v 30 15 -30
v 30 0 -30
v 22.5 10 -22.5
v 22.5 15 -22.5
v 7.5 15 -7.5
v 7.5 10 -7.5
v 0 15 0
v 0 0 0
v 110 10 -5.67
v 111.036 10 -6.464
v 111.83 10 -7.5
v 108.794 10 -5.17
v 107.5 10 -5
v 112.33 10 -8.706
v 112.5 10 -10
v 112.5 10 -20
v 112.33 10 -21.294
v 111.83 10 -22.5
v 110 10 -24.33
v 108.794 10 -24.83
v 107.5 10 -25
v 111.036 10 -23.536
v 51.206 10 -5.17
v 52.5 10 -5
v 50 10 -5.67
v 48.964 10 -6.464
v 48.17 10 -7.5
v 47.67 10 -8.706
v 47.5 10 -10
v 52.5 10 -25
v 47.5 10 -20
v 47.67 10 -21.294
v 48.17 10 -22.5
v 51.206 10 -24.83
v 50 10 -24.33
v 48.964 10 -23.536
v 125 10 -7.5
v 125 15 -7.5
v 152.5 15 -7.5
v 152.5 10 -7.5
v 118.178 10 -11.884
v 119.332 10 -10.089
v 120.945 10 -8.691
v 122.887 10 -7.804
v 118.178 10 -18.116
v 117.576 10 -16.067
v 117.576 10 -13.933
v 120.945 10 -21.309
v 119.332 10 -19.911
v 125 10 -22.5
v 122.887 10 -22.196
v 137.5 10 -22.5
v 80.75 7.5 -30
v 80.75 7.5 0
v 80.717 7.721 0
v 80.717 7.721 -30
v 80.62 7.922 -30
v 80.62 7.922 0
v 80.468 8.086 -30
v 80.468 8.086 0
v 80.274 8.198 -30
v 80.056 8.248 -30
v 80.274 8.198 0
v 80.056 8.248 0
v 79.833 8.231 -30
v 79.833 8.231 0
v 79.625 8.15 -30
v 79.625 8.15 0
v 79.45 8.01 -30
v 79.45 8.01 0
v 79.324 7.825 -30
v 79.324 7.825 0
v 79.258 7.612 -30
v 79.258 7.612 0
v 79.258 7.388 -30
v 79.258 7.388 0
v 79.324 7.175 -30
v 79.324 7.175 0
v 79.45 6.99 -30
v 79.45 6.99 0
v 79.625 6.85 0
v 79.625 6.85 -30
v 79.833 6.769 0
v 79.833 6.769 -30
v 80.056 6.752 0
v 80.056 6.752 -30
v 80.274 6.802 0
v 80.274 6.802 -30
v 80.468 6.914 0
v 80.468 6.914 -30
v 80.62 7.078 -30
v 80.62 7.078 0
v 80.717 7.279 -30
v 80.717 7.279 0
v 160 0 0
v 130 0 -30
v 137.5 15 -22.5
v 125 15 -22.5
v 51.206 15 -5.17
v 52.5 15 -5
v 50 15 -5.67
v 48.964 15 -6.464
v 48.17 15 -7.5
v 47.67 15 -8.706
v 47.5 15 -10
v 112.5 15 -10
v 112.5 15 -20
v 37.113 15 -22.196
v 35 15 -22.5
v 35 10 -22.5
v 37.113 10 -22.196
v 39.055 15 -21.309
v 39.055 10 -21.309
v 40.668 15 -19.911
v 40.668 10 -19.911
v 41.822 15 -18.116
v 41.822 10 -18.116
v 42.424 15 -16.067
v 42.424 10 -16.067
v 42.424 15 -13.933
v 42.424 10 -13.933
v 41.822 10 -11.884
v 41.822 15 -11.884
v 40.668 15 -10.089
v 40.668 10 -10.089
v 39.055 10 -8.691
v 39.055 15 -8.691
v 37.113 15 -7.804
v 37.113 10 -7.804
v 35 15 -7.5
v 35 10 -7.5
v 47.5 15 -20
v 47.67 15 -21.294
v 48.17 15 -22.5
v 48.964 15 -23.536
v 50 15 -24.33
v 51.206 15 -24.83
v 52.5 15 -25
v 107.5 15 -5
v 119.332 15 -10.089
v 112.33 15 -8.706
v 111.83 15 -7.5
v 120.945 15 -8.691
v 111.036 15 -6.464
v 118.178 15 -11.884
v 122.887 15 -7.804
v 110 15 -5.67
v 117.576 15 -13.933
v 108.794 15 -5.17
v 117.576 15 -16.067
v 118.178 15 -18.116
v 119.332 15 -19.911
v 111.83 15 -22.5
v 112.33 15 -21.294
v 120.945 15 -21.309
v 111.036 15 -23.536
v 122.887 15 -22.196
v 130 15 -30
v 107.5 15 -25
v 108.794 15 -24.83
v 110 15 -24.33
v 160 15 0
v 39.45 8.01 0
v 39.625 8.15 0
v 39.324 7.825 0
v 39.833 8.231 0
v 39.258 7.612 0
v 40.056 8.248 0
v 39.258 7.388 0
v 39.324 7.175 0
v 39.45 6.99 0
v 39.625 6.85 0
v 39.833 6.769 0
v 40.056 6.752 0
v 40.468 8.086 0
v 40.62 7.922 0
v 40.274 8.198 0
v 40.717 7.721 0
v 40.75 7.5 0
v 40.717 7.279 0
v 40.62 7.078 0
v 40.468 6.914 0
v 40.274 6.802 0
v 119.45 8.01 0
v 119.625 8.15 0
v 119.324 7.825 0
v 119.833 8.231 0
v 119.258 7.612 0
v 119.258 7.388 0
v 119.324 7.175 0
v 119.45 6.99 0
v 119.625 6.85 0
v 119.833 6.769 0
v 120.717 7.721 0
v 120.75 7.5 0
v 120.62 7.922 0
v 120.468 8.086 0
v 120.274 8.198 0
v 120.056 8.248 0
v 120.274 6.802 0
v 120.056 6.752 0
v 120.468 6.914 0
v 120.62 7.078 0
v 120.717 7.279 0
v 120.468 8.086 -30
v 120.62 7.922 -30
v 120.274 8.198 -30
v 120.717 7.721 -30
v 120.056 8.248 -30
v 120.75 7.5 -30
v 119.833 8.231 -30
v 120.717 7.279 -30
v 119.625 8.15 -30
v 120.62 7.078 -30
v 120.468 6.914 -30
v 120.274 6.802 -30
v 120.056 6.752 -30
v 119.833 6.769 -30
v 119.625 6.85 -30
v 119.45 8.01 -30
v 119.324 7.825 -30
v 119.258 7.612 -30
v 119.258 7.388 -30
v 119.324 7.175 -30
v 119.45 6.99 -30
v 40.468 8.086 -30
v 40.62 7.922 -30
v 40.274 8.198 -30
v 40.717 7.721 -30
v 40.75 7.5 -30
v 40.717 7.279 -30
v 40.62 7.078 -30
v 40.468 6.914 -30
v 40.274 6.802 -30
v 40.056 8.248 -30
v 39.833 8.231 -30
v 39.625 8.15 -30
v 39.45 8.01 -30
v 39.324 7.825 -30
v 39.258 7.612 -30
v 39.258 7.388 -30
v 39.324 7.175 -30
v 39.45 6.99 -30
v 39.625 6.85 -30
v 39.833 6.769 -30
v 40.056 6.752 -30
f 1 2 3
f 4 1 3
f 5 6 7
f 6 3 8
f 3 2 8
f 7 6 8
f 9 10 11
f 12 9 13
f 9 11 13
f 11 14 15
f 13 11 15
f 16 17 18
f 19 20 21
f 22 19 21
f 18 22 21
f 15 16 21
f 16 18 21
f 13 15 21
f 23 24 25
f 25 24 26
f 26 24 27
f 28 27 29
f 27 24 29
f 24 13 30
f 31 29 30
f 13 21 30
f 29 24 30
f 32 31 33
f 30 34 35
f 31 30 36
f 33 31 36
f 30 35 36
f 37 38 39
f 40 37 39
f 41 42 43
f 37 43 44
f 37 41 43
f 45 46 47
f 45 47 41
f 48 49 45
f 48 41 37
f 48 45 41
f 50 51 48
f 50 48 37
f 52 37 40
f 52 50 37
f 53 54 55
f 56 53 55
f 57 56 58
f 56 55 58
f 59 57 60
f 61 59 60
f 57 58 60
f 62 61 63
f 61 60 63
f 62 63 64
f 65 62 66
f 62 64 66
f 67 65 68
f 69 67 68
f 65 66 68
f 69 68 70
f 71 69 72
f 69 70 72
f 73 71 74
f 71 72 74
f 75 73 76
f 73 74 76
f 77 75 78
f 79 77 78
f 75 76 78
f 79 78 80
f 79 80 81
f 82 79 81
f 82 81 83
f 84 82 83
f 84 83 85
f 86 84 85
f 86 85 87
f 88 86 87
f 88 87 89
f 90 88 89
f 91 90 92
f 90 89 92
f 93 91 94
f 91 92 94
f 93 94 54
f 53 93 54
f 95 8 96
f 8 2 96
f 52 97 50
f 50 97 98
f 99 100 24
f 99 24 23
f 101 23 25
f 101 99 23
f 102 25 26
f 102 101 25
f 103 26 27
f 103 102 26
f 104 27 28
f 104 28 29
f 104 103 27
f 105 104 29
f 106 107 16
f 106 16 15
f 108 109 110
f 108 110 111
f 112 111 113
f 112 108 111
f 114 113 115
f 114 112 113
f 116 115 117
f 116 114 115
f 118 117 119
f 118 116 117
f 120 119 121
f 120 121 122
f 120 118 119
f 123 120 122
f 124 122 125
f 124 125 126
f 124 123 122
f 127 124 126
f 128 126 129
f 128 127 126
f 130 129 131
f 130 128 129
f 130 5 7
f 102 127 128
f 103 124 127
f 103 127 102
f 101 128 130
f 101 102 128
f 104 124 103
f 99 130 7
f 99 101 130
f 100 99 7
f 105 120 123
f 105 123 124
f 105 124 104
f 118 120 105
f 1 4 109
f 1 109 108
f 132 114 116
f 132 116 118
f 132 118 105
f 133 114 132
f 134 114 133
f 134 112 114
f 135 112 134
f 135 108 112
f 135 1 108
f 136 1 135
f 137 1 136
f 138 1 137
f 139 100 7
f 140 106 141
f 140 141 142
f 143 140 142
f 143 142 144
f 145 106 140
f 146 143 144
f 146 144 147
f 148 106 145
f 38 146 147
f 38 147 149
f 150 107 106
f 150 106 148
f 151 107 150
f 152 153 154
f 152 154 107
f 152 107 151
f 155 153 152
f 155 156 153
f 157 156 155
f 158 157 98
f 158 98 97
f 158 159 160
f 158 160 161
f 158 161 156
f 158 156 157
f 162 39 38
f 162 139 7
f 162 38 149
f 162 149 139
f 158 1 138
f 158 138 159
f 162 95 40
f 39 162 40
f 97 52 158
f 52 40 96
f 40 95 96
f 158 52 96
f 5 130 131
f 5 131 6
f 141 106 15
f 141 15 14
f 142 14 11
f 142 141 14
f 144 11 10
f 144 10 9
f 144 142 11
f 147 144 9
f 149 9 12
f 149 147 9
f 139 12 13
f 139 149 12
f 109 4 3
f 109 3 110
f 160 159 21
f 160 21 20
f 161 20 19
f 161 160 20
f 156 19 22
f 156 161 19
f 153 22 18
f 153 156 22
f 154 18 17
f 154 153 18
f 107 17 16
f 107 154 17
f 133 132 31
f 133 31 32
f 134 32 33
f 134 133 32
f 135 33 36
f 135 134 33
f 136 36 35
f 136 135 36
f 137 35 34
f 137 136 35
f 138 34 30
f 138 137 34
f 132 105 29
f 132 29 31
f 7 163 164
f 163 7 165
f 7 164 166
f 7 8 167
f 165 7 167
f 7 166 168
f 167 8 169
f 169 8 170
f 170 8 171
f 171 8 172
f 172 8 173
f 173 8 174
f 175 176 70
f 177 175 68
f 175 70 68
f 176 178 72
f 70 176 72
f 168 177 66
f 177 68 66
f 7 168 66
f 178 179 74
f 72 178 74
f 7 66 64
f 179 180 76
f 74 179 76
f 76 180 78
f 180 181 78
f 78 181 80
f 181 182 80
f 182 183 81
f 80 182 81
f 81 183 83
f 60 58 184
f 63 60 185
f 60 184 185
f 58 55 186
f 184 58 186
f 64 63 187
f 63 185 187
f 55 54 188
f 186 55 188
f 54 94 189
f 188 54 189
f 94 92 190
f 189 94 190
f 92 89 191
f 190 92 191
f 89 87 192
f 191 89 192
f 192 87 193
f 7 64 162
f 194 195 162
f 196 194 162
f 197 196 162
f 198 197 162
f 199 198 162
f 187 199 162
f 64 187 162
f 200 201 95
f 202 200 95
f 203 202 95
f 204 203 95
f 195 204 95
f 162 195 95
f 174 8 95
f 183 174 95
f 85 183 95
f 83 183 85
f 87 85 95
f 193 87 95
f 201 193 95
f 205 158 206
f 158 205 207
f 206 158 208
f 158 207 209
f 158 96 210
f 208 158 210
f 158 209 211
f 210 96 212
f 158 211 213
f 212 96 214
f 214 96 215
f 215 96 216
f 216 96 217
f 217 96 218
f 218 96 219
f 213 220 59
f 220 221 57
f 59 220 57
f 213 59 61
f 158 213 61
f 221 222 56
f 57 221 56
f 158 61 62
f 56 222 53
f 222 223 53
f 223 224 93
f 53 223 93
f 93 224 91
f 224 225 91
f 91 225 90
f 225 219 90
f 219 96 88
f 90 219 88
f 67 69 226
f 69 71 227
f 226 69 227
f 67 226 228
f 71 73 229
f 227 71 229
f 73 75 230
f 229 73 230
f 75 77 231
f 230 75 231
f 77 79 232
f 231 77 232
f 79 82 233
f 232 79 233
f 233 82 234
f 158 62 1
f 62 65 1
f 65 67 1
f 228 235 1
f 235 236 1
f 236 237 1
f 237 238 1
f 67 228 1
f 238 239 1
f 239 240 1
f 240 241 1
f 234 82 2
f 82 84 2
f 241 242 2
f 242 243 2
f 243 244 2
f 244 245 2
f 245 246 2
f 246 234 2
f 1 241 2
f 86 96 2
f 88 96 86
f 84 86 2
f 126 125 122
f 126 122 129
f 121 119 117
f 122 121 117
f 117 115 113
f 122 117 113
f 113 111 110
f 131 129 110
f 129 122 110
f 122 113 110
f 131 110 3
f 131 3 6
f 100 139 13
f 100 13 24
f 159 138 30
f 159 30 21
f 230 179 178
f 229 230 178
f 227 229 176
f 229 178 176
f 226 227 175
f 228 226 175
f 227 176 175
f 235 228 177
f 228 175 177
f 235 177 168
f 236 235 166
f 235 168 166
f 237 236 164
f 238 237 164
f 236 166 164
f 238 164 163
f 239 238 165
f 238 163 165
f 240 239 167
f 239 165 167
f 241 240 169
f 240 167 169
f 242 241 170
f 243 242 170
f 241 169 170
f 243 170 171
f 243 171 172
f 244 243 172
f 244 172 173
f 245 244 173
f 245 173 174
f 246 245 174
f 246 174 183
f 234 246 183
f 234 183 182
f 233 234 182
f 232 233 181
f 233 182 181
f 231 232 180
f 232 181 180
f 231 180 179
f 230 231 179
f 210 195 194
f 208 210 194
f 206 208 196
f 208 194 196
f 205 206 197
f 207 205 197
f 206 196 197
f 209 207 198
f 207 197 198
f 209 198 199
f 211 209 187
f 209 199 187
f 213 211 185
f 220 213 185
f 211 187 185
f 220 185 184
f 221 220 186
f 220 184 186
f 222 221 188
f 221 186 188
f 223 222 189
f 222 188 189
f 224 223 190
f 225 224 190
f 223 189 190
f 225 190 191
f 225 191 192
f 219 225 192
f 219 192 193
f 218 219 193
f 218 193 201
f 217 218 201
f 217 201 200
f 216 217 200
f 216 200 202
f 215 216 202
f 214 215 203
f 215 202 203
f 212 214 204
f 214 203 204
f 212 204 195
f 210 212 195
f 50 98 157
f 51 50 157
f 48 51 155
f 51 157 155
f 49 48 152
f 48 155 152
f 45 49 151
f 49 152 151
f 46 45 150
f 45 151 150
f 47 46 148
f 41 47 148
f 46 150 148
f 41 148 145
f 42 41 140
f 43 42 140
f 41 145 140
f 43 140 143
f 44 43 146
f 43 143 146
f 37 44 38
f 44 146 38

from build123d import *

# Parameters (mm, degrees)
BOSS_EXTRUDE1_DEPTH = 15
CUT_EXTRUDE1_DEPTH  = 5
SKETCH3_R           = 0.75
CUT_EXTRUDE2_DEPTH  = 30
CUT_EXTRUDE3_DEPTH  = 5


with BuildPart() as part:
    # Sketch1 → Boss-Extrude1 (new body)
    with BuildSketch(Plane(origin=(0, 0, 0), x_dir=(1, 0, 0), z_dir=(0, 1, 0))):
        Polygon((0, 0), (160, 0), (130, 30), (30, 30), align=None)
    extrude(amount=BOSS_EXTRUDE1_DEPTH)

    # Sketch2 → Cut-Extrude1 (cut)
    with BuildSketch(Plane(origin=(0, 15, 0), x_dir=(1, 0, 0), z_dir=(0, 1, 0))):
        with BuildLine():
            Line((-5, 22.5), (35, 22.5))
            ThreePointArc((35, 22.5), (42.5, 15), (35, 7.5))
            Line((35, 7.5), (-5, 7.5))
            ThreePointArc((-5, 7.5), (-12.5, 15), (-5, 22.5))
        make_face()
        with BuildLine():
            Line((165, 22.5), (125, 22.5))
            ThreePointArc((125, 22.5), (117.5, 15), (125, 7.5))
            Line((125, 7.5), (165, 7.5))
            ThreePointArc((165, 7.5), (172.5, 15), (165, 22.5))
        make_face()
    extrude(amount=-CUT_EXTRUDE1_DEPTH, mode=Mode.SUBTRACT)

    # Sketch3 → Cut-Extrude2 (cut)
    with BuildSketch(Plane.XY):
        with Locations((80, 7.5)):
            Circle(SKETCH3_R)
        with Locations((40, 7.5)):
            Circle(SKETCH3_R)
        with Locations((120, 7.5)):
            Circle(SKETCH3_R)
    extrude(amount=-CUT_EXTRUDE2_DEPTH, mode=Mode.SUBTRACT)

    # Sketch4 → Cut-Extrude3 (cut)
    with BuildSketch(Plane(origin=(0, 15, 0), x_dir=(1, 0, 0), z_dir=(0, 1, 0))):
        with BuildLine():
            Line((52.5, 25), (107.5, 25))
            ThreePointArc((107.5, 25), (111.035533906, 23.535533906), (112.5, 20))
            Line((112.5, 20), (112.5, 10))
            ThreePointArc((112.5, 10), (111.035533906, 6.464466094), (107.5, 5))
            Line((107.5, 5), (52.5, 5))
            ThreePointArc((52.5, 5), (48.964466094, 6.464466094), (47.5, 10))
            Line((47.5, 10), (47.5, 20))
            ThreePointArc((47.5, 20), (48.964466094, 23.535533906), (52.5, 25))
        make_face()
    extrude(amount=-CUT_EXTRUDE3_DEPTH, mode=Mode.SUBTRACT)


solid = part.part
